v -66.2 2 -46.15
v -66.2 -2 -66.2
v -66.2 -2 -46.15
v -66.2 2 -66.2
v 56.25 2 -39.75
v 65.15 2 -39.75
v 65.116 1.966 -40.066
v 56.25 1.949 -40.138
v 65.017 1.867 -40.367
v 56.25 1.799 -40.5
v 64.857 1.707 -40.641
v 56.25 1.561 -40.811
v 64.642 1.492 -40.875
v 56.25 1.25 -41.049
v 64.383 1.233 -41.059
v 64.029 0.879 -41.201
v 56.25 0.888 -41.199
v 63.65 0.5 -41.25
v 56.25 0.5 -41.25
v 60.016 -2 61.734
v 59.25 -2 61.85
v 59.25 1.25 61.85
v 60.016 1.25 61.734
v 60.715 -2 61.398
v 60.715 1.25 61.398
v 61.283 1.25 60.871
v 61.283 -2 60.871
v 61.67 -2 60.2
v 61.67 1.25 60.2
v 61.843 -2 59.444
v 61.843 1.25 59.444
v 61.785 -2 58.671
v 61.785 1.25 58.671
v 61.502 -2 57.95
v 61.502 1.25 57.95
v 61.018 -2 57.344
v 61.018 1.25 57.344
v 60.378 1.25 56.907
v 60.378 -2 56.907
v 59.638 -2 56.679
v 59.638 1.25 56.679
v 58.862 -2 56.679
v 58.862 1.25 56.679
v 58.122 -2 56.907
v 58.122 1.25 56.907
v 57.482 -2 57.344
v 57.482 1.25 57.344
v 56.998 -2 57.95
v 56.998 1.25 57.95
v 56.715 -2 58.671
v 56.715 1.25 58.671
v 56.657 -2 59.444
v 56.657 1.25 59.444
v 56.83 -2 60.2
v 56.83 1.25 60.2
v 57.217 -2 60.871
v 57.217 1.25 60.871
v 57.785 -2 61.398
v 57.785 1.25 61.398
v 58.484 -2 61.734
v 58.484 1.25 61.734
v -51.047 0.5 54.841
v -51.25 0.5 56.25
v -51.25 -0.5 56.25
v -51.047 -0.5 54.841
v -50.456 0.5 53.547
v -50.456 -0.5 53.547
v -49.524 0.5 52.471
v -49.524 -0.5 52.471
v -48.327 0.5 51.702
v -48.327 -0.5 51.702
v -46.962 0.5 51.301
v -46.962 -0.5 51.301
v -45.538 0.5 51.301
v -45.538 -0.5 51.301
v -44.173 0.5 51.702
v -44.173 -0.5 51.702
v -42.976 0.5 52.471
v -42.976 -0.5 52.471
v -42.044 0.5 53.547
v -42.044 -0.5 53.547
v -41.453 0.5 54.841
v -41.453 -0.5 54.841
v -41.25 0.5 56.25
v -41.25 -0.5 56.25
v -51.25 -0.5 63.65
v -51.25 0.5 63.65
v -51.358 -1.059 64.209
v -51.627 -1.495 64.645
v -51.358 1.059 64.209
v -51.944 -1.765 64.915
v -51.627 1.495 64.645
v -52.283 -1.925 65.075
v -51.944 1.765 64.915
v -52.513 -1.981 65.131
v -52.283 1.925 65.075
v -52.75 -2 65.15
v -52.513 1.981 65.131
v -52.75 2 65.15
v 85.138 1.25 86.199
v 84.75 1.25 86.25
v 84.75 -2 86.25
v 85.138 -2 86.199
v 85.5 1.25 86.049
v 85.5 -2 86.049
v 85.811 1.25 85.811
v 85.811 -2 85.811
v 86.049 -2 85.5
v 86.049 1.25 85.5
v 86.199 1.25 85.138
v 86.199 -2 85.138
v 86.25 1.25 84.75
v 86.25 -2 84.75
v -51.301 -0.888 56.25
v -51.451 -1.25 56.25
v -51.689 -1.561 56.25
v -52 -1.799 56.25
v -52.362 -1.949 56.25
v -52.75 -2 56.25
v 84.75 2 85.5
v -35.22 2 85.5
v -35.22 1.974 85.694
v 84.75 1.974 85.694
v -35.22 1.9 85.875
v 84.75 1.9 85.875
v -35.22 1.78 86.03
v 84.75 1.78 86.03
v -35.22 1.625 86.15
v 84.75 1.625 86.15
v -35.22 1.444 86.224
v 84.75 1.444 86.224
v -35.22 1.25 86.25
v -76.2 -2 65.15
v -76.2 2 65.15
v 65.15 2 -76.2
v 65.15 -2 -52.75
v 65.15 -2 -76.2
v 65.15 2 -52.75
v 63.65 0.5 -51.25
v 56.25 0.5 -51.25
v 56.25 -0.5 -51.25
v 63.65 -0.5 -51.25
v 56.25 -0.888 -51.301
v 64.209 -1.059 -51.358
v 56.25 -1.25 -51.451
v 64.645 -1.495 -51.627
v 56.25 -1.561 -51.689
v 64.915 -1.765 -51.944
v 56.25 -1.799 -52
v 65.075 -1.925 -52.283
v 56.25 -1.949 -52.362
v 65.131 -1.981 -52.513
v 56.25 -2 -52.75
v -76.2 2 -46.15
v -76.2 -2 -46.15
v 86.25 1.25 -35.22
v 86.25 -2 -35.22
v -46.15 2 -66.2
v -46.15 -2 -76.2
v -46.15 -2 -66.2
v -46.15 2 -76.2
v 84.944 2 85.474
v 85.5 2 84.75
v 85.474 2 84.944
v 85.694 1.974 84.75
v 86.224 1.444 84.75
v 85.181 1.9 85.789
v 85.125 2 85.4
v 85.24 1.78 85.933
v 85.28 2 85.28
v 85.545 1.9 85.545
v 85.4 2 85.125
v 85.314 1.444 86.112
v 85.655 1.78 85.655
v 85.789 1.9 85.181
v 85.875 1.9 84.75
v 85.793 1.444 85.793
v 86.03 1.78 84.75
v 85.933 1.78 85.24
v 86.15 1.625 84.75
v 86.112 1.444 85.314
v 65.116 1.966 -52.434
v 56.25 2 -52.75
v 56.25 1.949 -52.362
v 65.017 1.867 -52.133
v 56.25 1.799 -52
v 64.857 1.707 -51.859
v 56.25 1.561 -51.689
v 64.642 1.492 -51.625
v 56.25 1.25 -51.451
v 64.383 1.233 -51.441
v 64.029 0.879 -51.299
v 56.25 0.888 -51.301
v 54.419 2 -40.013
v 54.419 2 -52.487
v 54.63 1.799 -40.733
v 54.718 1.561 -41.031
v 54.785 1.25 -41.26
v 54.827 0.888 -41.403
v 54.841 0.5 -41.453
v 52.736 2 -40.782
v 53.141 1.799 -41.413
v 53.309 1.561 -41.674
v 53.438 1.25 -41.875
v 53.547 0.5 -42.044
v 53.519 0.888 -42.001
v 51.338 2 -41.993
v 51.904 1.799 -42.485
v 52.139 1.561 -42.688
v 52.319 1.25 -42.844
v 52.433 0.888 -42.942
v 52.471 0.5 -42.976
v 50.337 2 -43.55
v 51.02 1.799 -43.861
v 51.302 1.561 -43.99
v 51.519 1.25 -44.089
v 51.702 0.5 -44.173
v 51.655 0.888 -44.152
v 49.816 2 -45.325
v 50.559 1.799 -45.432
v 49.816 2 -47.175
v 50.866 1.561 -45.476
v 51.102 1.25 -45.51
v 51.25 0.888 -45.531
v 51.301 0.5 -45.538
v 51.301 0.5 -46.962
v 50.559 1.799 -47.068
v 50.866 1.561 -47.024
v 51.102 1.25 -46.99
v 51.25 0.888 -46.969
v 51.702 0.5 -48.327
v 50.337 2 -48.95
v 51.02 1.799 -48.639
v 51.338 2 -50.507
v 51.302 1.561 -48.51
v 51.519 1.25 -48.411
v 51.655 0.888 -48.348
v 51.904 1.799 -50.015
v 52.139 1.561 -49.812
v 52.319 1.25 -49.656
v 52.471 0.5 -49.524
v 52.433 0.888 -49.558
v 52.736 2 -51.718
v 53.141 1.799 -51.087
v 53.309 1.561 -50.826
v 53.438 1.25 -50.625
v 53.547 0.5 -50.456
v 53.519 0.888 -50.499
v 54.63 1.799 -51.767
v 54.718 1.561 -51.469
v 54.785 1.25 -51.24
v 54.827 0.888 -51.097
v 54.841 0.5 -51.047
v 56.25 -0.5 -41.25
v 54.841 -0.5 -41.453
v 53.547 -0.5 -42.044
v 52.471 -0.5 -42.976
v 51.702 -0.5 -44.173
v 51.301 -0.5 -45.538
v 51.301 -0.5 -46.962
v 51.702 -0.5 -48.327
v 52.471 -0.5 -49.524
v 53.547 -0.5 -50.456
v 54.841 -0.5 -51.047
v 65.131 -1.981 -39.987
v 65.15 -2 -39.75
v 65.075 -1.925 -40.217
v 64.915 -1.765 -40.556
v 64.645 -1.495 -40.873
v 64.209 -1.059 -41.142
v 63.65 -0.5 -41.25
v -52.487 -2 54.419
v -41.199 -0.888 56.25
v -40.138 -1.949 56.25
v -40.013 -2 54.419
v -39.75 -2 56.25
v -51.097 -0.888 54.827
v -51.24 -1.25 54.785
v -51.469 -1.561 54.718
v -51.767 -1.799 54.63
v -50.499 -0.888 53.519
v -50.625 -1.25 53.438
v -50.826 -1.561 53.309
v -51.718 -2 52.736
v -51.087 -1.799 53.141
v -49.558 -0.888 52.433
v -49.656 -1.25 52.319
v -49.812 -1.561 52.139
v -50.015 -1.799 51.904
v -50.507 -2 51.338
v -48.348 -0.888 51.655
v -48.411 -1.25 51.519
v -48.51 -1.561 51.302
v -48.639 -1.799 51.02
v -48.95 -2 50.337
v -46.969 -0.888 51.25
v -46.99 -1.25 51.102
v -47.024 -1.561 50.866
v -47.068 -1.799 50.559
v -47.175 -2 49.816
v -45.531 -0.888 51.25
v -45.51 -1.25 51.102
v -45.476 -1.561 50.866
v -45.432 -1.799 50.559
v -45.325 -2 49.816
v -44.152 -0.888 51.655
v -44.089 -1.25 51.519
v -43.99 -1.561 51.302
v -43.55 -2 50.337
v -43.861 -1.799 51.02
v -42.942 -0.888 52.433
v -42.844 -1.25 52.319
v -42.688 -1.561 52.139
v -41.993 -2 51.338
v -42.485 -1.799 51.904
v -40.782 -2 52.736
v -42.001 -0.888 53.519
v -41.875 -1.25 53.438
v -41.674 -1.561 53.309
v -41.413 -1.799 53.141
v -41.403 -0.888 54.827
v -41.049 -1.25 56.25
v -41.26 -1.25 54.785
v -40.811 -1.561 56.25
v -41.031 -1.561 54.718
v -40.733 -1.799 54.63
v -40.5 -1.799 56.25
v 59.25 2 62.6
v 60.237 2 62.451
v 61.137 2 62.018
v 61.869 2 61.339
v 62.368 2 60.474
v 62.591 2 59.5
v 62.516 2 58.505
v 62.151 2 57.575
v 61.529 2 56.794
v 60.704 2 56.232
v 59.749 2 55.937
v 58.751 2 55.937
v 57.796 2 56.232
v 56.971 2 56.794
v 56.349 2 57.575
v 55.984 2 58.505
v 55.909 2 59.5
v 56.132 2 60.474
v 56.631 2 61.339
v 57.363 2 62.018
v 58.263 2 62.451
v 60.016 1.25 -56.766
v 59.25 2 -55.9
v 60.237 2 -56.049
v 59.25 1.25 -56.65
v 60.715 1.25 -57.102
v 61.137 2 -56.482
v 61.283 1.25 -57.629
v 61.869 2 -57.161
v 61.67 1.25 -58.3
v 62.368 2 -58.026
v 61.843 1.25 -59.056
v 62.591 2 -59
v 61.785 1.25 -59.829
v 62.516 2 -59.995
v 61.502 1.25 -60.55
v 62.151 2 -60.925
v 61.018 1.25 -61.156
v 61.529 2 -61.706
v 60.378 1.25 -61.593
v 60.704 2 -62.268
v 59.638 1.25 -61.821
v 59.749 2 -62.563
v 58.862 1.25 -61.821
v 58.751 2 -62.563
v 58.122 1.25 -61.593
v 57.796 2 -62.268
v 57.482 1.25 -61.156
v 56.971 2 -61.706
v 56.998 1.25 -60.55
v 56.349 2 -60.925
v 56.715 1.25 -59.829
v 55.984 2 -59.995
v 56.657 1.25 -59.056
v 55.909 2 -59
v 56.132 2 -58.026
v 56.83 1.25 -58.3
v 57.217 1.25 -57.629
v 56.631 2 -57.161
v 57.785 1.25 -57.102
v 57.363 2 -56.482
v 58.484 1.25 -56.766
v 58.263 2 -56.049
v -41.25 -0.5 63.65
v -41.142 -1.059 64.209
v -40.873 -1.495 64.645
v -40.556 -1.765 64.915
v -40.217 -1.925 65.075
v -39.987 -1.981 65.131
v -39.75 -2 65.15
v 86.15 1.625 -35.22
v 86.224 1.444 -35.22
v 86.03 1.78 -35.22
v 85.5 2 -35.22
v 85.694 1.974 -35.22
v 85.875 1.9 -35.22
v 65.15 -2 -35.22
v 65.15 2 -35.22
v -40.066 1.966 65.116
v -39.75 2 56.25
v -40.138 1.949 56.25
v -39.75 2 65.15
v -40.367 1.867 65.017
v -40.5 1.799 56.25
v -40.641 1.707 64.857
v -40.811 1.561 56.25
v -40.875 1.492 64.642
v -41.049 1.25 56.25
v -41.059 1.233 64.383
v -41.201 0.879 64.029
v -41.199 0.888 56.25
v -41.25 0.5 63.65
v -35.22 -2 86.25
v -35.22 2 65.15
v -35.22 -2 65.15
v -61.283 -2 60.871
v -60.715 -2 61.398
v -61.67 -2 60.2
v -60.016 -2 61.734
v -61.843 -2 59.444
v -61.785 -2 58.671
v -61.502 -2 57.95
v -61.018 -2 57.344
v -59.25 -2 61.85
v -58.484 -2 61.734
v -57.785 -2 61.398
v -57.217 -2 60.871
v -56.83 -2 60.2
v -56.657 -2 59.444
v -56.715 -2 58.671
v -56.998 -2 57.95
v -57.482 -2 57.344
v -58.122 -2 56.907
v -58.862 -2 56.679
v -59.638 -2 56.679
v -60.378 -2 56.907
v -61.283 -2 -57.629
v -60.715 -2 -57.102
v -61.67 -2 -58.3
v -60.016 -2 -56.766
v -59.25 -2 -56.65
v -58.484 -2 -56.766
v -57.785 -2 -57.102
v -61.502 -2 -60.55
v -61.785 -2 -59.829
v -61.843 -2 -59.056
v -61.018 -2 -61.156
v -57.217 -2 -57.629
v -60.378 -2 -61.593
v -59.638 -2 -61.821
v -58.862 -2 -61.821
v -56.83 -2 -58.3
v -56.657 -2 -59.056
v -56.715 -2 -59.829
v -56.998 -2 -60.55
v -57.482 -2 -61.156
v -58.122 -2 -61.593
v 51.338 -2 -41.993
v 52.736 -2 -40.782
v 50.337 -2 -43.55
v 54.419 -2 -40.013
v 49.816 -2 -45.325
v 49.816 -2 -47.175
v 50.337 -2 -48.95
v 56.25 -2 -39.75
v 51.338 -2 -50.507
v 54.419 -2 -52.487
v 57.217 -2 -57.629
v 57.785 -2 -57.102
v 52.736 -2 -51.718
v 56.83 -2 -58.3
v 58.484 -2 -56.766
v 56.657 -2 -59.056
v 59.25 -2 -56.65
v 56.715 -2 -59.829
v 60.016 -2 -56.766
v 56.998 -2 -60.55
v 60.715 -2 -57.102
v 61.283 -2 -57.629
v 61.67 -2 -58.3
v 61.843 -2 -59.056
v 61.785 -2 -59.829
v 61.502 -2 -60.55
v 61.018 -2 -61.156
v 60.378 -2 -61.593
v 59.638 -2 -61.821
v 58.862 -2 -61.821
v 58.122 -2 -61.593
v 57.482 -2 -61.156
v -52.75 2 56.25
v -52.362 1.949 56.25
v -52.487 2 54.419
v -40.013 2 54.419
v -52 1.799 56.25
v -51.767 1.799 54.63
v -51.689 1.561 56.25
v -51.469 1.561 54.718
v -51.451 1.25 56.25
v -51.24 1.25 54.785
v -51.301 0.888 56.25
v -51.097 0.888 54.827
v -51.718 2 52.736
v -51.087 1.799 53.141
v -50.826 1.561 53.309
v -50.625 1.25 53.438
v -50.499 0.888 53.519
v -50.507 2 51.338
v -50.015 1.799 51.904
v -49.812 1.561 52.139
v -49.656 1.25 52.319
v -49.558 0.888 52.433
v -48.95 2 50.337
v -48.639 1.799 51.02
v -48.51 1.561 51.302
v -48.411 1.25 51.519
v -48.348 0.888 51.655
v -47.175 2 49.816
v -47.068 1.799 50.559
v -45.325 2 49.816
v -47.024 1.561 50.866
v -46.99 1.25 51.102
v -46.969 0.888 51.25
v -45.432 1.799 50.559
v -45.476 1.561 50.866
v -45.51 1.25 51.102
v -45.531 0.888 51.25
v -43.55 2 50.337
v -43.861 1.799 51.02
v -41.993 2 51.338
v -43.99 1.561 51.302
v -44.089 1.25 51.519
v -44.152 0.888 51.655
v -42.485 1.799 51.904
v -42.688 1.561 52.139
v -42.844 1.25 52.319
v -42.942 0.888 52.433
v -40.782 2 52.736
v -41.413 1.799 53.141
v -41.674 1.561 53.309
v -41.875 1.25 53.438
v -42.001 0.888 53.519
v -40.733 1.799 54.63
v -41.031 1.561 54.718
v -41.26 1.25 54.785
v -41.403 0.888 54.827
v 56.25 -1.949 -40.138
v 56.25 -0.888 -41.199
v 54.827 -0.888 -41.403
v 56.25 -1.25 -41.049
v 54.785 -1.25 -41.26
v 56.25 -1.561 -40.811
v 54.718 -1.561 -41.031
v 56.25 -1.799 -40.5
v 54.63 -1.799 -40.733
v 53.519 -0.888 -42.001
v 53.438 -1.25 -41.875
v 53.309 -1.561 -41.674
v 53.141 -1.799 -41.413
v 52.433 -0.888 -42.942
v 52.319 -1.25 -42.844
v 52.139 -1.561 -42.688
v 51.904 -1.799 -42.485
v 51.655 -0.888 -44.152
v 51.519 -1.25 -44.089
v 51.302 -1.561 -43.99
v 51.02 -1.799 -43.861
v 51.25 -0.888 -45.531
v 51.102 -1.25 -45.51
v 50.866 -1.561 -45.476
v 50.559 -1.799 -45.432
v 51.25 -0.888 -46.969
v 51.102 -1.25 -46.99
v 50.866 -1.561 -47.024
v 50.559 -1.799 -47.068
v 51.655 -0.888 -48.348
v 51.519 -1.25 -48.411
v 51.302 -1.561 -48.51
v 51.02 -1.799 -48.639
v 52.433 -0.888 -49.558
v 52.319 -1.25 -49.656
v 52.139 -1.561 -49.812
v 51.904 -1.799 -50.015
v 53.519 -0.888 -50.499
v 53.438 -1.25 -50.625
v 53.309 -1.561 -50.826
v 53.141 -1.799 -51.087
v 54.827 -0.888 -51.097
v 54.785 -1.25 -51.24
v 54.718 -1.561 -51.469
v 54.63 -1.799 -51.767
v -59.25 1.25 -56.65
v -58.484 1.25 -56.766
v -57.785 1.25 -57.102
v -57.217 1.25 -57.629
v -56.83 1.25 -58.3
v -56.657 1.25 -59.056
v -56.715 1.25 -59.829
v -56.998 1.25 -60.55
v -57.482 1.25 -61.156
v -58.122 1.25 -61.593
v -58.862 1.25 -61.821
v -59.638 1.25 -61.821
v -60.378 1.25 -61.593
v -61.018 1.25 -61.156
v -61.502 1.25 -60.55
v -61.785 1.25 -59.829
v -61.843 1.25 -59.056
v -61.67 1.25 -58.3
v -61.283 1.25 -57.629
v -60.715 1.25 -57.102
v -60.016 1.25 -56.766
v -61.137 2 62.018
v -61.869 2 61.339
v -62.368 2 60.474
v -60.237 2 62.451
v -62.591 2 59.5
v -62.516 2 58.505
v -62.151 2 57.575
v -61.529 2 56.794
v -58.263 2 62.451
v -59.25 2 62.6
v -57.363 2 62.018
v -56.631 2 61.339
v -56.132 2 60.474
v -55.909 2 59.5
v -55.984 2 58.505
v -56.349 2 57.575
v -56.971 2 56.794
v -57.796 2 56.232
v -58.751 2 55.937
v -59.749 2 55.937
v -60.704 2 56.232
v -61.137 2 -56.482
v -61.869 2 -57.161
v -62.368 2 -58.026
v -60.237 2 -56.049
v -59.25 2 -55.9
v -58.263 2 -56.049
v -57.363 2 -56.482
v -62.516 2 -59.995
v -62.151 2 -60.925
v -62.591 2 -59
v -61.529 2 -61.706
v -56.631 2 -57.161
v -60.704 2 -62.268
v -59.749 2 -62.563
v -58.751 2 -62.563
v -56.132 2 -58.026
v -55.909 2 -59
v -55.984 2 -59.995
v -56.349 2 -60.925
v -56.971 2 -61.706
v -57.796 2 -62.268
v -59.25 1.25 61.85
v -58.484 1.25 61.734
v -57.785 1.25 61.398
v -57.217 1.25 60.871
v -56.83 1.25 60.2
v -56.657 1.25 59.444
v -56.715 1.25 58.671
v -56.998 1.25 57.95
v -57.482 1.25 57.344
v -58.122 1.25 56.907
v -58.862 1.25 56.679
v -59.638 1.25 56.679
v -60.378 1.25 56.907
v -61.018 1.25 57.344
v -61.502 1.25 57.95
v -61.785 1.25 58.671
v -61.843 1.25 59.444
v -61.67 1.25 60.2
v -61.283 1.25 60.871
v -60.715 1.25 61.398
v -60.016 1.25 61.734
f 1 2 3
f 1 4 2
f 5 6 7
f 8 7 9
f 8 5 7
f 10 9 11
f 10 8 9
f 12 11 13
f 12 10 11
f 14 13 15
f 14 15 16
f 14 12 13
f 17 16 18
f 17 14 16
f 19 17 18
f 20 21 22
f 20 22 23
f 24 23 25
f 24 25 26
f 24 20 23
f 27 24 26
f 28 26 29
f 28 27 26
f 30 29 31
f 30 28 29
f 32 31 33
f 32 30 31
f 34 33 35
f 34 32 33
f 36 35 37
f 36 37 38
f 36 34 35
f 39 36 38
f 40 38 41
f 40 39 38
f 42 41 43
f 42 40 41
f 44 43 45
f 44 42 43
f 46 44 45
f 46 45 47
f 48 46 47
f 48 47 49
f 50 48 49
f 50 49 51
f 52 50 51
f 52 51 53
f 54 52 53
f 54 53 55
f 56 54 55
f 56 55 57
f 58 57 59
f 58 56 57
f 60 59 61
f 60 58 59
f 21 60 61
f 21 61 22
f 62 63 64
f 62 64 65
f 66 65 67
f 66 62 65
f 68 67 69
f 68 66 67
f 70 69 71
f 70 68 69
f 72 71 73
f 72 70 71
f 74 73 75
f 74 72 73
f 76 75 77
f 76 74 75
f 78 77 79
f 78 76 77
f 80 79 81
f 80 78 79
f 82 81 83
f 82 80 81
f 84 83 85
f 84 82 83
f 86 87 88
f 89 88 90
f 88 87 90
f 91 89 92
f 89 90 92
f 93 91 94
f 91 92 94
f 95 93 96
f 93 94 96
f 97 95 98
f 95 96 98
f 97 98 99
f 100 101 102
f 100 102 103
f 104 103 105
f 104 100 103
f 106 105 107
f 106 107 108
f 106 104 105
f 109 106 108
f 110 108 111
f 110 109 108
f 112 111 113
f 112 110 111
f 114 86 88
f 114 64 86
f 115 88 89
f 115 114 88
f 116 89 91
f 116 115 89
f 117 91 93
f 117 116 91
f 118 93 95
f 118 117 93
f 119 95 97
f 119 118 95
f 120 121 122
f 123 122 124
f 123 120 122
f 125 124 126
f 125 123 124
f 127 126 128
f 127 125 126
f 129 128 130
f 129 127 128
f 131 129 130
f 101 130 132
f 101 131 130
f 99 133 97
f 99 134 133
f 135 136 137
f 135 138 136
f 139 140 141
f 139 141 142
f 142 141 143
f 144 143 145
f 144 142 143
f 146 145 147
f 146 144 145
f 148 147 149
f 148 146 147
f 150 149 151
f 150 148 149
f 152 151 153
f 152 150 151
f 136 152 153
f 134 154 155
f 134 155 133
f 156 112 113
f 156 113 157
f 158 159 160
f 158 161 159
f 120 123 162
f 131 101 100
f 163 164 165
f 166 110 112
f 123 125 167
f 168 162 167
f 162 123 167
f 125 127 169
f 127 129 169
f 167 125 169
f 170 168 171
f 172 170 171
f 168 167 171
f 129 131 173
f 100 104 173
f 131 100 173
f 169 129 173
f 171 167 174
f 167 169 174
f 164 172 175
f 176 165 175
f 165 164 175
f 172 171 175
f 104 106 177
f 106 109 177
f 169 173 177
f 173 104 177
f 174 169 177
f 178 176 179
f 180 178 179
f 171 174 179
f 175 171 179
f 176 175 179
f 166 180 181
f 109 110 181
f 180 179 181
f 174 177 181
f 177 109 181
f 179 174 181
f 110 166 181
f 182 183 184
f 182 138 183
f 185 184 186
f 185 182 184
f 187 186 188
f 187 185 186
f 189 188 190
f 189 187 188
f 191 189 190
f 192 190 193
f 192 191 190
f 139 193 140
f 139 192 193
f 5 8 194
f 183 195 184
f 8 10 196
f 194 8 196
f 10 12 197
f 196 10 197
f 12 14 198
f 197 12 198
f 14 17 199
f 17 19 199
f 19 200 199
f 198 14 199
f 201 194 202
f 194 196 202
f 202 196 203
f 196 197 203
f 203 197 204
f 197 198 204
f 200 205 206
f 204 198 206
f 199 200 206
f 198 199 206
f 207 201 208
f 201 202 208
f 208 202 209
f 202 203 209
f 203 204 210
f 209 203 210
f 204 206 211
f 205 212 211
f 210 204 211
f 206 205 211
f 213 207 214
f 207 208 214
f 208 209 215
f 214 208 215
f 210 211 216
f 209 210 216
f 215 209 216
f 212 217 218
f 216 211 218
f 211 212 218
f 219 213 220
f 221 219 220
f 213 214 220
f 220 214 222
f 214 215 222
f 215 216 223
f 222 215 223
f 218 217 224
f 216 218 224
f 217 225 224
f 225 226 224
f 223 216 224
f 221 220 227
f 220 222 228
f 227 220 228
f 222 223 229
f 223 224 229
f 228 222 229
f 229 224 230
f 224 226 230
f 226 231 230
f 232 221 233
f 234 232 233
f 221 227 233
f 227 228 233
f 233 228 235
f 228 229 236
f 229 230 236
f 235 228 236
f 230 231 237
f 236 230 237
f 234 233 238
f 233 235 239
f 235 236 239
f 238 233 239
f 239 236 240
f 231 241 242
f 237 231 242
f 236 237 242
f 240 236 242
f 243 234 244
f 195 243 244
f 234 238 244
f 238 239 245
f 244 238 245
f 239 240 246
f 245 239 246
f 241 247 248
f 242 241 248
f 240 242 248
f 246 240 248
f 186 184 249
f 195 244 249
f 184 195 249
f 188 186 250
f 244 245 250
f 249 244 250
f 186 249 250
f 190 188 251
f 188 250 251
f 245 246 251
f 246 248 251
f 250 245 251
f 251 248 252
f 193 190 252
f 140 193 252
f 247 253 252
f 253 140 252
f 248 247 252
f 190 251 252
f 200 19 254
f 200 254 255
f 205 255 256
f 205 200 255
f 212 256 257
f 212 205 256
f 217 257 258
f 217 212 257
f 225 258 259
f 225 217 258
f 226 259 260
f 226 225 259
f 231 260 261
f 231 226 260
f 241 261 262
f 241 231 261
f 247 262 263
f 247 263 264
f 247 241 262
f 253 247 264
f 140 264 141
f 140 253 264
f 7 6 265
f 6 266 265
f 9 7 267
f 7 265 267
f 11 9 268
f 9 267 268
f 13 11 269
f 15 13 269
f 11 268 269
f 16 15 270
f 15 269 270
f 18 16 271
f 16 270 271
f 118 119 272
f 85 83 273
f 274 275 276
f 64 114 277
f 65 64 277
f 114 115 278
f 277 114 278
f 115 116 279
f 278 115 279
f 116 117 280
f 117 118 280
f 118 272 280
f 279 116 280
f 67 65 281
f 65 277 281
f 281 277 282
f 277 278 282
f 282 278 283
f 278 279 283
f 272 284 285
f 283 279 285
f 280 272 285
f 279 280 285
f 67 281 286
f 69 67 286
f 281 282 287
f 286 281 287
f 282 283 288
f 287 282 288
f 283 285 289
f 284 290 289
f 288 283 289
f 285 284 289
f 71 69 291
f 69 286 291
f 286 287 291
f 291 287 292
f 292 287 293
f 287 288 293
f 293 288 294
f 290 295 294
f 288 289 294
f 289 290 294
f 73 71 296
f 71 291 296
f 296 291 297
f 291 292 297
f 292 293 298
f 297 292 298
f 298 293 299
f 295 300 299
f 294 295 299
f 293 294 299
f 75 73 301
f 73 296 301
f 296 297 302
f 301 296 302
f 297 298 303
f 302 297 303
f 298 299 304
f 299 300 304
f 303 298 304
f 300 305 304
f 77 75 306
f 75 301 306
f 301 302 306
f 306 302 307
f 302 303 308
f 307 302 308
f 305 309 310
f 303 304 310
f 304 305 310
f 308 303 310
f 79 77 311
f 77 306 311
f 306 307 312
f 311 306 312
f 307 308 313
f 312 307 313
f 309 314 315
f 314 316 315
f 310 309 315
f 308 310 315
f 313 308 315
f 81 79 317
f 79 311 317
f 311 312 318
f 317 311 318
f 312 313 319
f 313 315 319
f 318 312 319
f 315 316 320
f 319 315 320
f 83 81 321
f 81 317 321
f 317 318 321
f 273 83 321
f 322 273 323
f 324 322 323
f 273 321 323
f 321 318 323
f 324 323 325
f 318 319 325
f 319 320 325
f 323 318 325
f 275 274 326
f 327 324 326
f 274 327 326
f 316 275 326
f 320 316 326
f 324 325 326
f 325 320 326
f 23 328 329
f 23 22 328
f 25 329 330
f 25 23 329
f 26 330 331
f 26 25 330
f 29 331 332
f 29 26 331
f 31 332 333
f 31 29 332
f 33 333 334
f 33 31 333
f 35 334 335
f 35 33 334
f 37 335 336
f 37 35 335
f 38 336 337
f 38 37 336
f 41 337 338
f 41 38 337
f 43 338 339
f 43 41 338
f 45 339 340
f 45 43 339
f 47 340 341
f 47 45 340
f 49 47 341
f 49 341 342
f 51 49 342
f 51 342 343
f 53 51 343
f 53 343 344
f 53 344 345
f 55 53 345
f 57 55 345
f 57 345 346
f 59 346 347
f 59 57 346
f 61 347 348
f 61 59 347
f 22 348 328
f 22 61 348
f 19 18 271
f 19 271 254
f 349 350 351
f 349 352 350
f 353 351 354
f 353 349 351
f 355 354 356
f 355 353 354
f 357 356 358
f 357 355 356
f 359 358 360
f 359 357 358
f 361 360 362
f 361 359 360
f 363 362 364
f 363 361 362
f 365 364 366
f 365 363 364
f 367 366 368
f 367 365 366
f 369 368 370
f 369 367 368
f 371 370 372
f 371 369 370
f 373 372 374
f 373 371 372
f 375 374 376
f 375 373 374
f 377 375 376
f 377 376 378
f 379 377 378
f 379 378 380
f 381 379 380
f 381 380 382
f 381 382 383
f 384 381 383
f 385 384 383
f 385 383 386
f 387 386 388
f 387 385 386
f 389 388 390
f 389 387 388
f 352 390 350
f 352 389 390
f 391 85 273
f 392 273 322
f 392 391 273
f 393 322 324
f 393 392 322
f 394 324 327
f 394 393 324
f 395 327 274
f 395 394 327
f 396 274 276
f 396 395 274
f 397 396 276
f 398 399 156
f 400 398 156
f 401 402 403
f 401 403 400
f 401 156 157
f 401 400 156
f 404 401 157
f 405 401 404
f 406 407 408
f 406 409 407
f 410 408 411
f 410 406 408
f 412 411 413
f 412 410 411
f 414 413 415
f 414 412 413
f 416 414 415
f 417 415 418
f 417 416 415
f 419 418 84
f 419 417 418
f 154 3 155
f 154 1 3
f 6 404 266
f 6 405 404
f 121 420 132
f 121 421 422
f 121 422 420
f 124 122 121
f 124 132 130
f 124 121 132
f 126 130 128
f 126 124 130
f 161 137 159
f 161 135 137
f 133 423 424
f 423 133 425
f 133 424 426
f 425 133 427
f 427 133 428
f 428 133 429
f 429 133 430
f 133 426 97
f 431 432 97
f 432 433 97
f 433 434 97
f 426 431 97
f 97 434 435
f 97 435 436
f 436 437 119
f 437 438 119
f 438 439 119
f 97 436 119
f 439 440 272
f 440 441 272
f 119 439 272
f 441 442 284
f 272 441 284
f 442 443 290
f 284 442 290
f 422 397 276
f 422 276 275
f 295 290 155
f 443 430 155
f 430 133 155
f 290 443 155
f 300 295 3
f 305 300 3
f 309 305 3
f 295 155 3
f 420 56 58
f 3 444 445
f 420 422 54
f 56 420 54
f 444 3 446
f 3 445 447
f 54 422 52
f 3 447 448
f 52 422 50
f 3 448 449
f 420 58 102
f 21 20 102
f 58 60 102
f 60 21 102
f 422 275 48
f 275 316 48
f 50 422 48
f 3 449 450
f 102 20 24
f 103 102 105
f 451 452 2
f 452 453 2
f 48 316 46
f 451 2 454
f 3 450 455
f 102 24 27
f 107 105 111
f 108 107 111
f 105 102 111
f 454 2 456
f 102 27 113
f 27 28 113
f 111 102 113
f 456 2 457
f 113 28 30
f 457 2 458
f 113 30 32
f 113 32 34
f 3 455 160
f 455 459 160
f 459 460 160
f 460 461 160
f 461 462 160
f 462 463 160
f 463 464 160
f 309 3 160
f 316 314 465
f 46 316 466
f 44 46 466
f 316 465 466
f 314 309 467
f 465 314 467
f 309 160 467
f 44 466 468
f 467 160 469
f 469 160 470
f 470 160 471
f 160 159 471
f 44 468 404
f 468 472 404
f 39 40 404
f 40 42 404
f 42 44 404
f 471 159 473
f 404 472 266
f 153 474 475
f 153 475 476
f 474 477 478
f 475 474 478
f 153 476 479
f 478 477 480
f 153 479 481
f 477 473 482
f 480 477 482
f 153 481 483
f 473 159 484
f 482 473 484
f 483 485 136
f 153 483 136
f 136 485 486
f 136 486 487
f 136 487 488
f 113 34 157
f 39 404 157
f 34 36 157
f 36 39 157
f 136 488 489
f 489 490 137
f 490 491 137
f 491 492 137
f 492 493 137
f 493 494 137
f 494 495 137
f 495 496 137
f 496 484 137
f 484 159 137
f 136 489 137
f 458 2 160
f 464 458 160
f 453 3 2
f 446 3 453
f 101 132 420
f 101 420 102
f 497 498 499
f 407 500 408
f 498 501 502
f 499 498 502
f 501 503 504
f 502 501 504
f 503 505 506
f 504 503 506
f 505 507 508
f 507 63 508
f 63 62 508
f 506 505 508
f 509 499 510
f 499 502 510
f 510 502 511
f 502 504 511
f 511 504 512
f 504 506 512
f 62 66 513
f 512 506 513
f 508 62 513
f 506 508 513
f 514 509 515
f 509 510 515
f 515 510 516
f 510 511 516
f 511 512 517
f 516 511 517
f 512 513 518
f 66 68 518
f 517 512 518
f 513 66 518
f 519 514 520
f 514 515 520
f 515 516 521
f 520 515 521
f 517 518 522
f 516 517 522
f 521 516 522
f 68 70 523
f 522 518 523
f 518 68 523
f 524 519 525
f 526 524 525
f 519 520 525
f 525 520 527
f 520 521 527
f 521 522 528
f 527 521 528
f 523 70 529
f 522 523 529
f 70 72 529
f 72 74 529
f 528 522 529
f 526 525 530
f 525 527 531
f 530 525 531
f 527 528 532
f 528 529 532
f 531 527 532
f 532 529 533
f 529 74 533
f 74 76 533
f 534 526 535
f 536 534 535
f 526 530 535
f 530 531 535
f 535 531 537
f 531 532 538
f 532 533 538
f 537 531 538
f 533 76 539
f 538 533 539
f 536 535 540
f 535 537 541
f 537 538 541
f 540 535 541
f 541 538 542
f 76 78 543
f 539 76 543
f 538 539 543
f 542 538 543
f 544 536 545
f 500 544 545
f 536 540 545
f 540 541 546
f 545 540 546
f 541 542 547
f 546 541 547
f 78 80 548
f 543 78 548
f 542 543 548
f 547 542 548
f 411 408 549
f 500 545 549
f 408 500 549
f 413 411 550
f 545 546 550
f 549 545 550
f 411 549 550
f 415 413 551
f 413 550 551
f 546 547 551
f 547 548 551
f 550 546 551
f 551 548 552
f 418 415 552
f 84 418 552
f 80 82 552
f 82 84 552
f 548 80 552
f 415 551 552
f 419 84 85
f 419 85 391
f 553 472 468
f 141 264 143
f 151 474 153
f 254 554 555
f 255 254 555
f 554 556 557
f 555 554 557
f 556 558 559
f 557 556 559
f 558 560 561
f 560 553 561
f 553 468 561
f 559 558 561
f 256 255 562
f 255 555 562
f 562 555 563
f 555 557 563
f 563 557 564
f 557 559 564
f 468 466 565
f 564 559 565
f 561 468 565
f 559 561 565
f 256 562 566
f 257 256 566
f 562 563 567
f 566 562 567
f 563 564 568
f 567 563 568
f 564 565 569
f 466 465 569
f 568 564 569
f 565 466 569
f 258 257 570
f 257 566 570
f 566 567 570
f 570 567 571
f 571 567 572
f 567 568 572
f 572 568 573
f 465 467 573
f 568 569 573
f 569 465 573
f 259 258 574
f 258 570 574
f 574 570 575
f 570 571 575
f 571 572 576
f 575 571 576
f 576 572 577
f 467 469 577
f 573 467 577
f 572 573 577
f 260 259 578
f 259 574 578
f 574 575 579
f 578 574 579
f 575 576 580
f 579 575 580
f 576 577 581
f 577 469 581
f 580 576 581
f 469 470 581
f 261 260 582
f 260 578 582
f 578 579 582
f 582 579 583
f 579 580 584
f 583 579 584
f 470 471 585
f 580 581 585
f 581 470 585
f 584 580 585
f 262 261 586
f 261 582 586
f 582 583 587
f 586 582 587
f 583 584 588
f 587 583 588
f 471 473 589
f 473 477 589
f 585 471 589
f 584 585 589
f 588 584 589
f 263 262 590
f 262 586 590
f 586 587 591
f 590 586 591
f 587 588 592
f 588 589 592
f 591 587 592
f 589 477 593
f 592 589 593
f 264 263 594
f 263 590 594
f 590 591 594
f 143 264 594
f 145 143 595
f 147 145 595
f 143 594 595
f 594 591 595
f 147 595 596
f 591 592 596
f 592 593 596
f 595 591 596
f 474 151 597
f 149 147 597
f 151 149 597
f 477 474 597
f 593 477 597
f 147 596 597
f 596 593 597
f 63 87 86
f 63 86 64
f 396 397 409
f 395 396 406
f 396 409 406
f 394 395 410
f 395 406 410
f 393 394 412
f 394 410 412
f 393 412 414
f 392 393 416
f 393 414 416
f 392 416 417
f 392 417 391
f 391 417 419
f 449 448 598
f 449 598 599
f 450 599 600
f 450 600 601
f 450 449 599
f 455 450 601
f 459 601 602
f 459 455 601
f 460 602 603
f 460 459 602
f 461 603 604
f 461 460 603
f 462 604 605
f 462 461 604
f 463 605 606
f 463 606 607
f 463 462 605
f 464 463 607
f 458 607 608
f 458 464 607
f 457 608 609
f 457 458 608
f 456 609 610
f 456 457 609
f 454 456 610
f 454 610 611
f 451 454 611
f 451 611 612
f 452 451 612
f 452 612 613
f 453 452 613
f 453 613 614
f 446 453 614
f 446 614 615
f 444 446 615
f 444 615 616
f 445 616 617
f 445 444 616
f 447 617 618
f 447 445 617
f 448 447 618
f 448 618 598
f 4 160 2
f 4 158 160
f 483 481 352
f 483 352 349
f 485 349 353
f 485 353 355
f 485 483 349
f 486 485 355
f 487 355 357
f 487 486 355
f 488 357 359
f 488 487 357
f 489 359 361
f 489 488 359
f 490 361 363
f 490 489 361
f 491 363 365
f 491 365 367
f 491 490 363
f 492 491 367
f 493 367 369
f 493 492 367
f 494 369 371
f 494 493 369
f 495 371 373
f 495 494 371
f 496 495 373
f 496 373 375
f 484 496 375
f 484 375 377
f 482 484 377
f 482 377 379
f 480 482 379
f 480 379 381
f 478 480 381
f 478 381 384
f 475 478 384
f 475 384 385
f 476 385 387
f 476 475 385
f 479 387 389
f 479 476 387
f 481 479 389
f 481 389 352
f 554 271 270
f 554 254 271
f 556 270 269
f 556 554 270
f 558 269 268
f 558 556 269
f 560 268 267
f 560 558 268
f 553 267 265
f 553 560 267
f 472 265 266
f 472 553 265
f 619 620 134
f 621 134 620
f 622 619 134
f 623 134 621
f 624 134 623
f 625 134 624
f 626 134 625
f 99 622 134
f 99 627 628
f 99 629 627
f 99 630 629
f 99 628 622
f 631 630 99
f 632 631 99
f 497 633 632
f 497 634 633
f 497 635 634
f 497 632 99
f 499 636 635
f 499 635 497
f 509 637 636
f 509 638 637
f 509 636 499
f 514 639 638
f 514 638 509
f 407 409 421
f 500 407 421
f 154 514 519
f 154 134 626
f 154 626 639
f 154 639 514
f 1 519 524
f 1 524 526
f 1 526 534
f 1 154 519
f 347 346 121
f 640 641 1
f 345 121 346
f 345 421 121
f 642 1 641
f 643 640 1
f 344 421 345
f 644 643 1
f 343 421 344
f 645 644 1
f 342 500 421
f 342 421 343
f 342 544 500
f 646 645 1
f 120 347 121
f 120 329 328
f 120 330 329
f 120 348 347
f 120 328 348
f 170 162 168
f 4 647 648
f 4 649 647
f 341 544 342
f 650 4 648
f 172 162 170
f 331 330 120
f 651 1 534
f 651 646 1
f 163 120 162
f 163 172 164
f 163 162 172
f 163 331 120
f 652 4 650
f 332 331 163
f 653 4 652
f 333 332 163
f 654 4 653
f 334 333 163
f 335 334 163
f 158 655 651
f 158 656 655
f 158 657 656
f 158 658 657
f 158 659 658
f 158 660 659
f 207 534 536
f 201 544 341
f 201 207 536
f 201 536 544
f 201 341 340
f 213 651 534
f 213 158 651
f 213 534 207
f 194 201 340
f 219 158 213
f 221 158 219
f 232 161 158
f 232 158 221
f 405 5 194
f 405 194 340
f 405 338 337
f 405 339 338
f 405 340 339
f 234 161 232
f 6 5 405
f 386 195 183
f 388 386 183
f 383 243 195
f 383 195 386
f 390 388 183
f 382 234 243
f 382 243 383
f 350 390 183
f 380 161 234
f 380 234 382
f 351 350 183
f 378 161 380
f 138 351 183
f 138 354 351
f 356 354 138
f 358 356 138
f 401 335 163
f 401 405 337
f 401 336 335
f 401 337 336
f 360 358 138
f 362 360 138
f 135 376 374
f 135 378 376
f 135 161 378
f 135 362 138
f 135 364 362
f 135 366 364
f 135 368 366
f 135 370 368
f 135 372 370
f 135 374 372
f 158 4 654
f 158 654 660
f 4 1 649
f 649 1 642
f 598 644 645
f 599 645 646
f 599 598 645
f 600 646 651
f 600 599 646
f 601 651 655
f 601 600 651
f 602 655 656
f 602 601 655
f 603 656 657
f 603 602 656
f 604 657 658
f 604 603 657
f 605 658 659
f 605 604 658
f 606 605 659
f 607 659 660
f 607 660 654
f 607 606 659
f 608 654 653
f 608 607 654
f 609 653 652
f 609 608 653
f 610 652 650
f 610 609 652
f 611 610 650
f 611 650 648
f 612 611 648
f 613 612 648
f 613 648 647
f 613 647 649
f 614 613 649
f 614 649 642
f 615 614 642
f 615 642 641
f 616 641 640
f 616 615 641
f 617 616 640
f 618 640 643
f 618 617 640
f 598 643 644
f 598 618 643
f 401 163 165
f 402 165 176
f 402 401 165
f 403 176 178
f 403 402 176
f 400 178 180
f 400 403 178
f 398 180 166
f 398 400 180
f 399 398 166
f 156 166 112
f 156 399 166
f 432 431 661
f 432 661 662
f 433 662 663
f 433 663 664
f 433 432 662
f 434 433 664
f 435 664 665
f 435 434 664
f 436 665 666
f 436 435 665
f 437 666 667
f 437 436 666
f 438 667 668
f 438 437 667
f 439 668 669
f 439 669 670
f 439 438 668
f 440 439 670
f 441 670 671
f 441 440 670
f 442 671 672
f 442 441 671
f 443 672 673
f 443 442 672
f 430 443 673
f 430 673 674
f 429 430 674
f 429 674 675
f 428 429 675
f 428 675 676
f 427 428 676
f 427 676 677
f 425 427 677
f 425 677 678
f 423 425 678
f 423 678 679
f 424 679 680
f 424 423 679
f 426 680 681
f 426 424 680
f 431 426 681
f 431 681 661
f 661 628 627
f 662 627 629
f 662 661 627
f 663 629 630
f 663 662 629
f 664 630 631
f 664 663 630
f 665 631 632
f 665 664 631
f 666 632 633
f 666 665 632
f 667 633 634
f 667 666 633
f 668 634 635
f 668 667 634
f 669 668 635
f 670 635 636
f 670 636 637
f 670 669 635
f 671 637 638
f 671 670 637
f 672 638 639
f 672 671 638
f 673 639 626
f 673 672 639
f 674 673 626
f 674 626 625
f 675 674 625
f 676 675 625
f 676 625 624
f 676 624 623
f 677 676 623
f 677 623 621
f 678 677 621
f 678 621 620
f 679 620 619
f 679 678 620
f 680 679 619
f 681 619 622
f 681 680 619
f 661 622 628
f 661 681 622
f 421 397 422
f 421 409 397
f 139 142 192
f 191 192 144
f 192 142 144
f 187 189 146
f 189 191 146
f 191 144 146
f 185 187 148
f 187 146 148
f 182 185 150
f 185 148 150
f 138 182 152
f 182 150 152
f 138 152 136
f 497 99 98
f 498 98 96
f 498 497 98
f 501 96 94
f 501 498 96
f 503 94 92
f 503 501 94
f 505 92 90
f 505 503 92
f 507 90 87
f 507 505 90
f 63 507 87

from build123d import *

# Parameters (mm, degrees)
SKETCH1_R           = 1.85
BOSS_EXTRUDE1_DEPTH = 2
CHAMFER2_SIZE       = 1.5
CUT_EXTRUDE2_START  = -2
SKETCH1_4_R         = 2.6
SKETCH1_4_R_2       = 1.85
CUT_EXTRUDE2_DEPTH  = 3.25
FILLET1_R           = 0.75
FILLET2_R           = 1.5


with BuildPart() as part:
    # Sketch1 → Boss-Extrude1 (new, symmetric)
    with BuildSketch(Plane(origin=(0, 0, 0), x_dir=(1, 0, 0), z_dir=(0, 1, 0))):
        with BuildLine():
            Line((-66.2, 46.15), (-76.2, 46.15))
            Line((-76.2, 46.15), (-76.2, -65.15))
            Line((-76.2, -65.15), (-51.25, -65.15))
            Line((-51.25, -65.15), (-51.25, -56.25))
            ThreePointArc((-51.25, -56.25), (-46.25, -51.25), (-41.25, -56.25))
            Line((-41.25, -56.25), (-41.25, -65.15))
            Line((-41.25, -65.15), (-35.22, -65.15))
            Line((-35.22, -65.15), (-35.22, -86.25))
            Line((-35.22, -86.25), (84.75, -86.25))
            ThreePointArc((84.75, -86.25), (85.810660172, -85.810660172), (86.25, -84.75))
            Line((86.25, -84.75), (86.25, 35.22))
            Line((86.25, 35.22), (65.15, 35.22))
            Line((65.15, 35.22), (65.15, 41.25))
            Line((65.15, 41.25), (56.25, 41.25))
            ThreePointArc((56.25, 41.25), (51.25, 46.25), (56.25, 51.25))
            Line((56.25, 51.25), (65.15, 51.25))
            Line((65.15, 51.25), (65.15, 76.2))
            Line((65.15, 76.2), (-46.15, 76.2))
            Line((-46.15, 76.2), (-46.15, 66.2))
            Line((-46.15, 66.2), (-66.2, 66.2))
            Line((-66.2, 66.2), (-66.2, 46.15))
        make_face()
        with Locations(Location((-59.25, 59.25, 0), (0, 0, 270))):
            Circle(SKETCH1_R, mode=Mode.SUBTRACT)
        with Locations(Location((-59.25, -59.25, 0), (0, 0, 270))):
            Circle(SKETCH1_R, mode=Mode.SUBTRACT)
        with Locations(Location((59.25, -59.25, 0), (0, 0, 270))):
            Circle(SKETCH1_R, mode=Mode.SUBTRACT)
        with Locations(Location((59.25, 59.25, 0), (0, 0, 270))):
            Circle(SKETCH1_R, mode=Mode.SUBTRACT)
    extrude(amount=BOSS_EXTRUDE1_DEPTH, both=True)

    # Chamfer2
    chamfer2_edges = [part.edges().sort_by_distance(p)[0] for p in [
        (-59.25, 2, 57.4),
        (59.25, 2, 57.4),
        (59.25, 2, -61.1),
        (-59.25, 2, -61.1),
    ]]
    chamfer(chamfer2_edges, length=CHAMFER2_SIZE)

    # Sketch1<4> → Cut-Extrude2 (cut)
    # profile 1 of 4: a face of its own
    with BuildSketch(Plane(origin=(0, 0, 0), x_dir=(1, 0, 0), z_dir=(0, 1, 0)).offset(CUT_EXTRUDE2_START)):
        with Locations(Location((-59.25, 59.25, 0), (0, 0, 270))):
            Circle(SKETCH1_4_R)
        with Locations((-59.25, 59.25)):
            Circle(SKETCH1_4_R_2, mode=Mode.SUBTRACT)
    # profile 2 of 4: a face of its own
    with BuildSketch(Plane(origin=(0, 0, 0), x_dir=(1, 0, 0), z_dir=(0, 1, 0)).offset(CUT_EXTRUDE2_START)):
        with Locations(Location((-59.25, -59.25, 0), (0, 0, 270))):
            Circle(SKETCH1_4_R)
        with Locations((-59.25, -59.25)):
            Circle(SKETCH1_4_R_2, mode=Mode.SUBTRACT)
    # profile 3 of 4: a face of its own
    with BuildSketch(Plane(origin=(0, 0, 0), x_dir=(1, 0, 0), z_dir=(0, 1, 0)).offset(CUT_EXTRUDE2_START)):
        with Locations(Location((59.25, -59.25, 0), (0, 0, 270))):
            Circle(SKETCH1_4_R)
        with Locations((59.25, -59.25)):
            Circle(SKETCH1_4_R_2, mode=Mode.SUBTRACT)
    # profile 4 of 4: a face of its own
    with BuildSketch(Plane(origin=(0, 0, 0), x_dir=(1, 0, 0), z_dir=(0, 1, 0)).offset(CUT_EXTRUDE2_START)):
        with Locations(Location((59.25, 59.25, 0), (0, 0, 270))):
            Circle(SKETCH1_4_R)
        with Locations((59.25, 59.25)):
            Circle(SKETCH1_4_R_2, mode=Mode.SUBTRACT)
    extrude(amount=CUT_EXTRUDE2_DEPTH, mode=Mode.SUBTRACT)

    # Fillet1
    fillet1_edges = [part.edges().sort_by_distance(p)[0] for p in [
        (24.765, 2, 86.25),
        (85.810660172, 2, 85.810660172),
        (86.25, 2, 24.765),
    ]]
    fillet(fillet1_edges, radius=FILLET1_R)

    # Fillet2
    fillet2_edges = [part.edges().sort_by_distance(p)[0] for p in [
        (51.25, 2, -46.25),
        (60.7, 2, -51.25),
        (-41.25, -2, 60.7),
        (-46.25, -2, 51.25),
        (-51.25, -2, 60.7),
        (60.7, -2, -51.25),
        (51.25, -2, -46.25),
        (60.7, -2, -41.25),
        (65.15, 0, -41.25),
        (-41.25, 0, 65.15),
        (-51.25, 0, 65.15),
        (65.15, 0, -51.25),
        (-51.25, 2, 60.7),
        (-46.25, 2, 51.25),
        (-41.25, 2, 60.7),
        (60.7, 2, -41.25),
    ]]
    fillet(fillet2_edges, radius=FILLET2_R)


solid = part.part
